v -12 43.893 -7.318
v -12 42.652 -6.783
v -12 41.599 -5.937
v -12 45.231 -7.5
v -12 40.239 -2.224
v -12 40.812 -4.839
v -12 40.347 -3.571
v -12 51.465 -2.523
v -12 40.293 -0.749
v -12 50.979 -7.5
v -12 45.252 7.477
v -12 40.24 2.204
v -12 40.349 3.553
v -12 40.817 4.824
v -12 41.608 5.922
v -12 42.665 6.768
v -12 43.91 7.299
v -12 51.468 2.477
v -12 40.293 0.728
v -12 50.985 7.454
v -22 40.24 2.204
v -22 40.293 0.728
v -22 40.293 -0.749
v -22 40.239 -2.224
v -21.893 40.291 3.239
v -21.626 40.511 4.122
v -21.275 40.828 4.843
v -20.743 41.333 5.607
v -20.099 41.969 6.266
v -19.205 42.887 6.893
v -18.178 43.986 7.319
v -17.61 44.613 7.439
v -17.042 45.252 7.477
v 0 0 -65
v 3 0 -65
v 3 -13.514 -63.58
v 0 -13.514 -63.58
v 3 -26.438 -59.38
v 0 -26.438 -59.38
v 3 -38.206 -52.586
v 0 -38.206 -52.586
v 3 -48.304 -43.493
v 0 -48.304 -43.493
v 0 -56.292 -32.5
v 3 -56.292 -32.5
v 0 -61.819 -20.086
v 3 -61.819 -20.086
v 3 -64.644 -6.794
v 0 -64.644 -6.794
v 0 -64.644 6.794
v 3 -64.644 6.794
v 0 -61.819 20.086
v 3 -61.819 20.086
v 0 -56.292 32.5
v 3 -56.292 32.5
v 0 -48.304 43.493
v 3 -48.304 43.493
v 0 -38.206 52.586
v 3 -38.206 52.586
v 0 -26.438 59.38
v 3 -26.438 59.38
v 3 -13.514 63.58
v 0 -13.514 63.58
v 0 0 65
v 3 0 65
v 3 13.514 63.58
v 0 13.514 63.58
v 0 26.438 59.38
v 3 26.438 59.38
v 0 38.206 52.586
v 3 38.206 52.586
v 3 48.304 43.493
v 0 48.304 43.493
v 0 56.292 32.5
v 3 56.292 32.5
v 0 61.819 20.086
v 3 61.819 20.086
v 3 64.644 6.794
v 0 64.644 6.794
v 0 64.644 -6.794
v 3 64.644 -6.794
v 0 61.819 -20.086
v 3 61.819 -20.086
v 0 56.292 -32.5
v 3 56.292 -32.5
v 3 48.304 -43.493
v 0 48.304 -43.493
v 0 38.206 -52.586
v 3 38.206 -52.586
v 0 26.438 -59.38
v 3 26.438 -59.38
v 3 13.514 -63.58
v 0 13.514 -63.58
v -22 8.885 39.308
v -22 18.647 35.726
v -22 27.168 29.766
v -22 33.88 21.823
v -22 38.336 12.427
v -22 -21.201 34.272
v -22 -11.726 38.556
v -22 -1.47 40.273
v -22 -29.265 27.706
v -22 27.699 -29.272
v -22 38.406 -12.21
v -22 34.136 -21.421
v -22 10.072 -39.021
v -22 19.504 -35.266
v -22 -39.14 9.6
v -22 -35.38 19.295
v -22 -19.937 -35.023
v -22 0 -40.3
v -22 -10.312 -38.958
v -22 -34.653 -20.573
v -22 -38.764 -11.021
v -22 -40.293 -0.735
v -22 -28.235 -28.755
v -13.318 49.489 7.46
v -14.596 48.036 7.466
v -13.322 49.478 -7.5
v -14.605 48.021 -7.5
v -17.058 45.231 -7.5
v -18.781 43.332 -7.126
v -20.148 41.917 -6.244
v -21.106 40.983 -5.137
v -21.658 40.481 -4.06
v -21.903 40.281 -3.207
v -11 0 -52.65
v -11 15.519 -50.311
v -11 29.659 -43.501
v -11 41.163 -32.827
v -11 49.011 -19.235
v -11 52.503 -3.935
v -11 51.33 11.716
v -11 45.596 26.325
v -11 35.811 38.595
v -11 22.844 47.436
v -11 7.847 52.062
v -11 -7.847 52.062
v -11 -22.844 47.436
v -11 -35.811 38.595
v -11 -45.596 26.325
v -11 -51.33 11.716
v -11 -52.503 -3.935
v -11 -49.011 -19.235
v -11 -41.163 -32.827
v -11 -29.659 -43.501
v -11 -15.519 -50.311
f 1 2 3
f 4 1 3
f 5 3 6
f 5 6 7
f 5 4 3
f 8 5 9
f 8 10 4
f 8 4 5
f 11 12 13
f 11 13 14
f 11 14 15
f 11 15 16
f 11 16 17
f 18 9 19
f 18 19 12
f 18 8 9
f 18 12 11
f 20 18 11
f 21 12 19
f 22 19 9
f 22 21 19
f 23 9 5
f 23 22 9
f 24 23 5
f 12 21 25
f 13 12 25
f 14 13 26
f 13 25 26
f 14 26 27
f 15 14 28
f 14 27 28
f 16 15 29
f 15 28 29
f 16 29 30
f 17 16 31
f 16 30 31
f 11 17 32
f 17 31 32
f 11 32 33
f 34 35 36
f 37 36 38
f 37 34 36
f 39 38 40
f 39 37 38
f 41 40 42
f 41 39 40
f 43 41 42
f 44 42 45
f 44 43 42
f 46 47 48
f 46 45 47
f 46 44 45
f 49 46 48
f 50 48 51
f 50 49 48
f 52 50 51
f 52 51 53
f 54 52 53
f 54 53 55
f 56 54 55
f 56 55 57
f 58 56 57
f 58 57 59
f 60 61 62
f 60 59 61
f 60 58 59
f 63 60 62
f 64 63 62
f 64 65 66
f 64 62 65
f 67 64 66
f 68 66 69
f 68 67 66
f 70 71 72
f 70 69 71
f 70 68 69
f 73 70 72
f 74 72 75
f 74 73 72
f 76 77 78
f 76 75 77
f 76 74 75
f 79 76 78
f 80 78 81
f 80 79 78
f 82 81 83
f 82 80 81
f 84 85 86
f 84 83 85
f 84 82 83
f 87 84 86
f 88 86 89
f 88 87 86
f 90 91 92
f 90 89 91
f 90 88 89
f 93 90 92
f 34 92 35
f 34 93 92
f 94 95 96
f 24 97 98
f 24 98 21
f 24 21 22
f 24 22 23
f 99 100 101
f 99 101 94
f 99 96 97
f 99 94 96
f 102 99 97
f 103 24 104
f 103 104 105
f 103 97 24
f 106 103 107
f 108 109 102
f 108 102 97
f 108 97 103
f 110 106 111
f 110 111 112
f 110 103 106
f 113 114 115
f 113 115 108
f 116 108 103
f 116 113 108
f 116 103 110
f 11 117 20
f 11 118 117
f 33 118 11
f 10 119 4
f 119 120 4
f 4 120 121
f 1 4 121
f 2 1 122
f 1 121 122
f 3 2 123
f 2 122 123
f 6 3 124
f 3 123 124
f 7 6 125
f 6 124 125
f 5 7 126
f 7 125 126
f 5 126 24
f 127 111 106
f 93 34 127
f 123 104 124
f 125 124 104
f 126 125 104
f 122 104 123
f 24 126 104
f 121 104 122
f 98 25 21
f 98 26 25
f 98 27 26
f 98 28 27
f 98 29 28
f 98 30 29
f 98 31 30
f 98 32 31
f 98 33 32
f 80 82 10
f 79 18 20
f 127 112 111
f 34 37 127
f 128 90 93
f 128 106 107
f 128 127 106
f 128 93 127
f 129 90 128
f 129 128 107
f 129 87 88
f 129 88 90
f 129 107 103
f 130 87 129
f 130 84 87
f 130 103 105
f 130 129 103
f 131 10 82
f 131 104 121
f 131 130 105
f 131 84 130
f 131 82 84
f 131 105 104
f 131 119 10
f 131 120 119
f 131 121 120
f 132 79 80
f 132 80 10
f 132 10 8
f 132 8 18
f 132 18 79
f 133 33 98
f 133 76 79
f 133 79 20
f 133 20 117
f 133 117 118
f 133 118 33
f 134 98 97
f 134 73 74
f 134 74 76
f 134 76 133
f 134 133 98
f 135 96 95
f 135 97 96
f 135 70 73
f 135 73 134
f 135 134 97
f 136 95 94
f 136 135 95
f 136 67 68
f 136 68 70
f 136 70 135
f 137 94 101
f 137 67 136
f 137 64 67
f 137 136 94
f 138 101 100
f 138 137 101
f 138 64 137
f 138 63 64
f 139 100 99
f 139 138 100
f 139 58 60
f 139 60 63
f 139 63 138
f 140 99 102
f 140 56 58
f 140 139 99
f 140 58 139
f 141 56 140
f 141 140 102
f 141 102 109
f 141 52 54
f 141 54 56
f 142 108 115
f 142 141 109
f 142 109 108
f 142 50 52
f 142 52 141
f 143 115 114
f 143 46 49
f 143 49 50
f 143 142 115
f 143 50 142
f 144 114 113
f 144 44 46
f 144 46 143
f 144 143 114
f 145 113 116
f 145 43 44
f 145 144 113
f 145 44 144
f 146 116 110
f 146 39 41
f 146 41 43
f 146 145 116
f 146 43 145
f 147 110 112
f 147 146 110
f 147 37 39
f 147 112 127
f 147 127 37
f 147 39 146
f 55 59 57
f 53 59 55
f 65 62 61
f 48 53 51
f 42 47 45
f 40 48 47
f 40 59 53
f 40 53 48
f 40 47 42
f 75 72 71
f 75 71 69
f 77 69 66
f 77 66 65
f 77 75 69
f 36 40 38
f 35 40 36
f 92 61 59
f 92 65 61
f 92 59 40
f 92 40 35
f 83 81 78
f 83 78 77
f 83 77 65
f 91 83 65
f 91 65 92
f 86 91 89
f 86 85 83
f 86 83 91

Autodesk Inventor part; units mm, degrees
ref_plane "YZ Plane" through (0, 0, 0) normal (1, 0, 0) x (0, 1, 0)
ref_plane "XZ Plane" through (0, 0, 0) normal (0, 1, 0) x (-1, 0, 0)
ref_plane "XY Plane" through (0, 0, 0) normal (0, 0, 1) x (1, 0, 0)
sketch "Sketch2" plane through (0, 0, 0) normal (0, 1, 0) x (-1, 0, 0)
  line L0 (0, 0) -> (0, -65)
  line L1 (0, 0) -> (22, 0)
  line L2 (22, 0) -> (22, -40.3)
  line L3 (22, -40.3) -> (0, -65)
  dimension "d4" = 65
  dimension "d5" = 22
  dimension "d6" = 40.3
revolve "Revolution1" add sketch "Sketch2" angle 360 about axis through (0, 0, 0) along (-1, 0, 0)
sketch "Sketch3" plane through (-22, 0, 0) normal (-1, 0, 0) x (0, 0, 1)
  circle A0 centre (0, 0) radius 40.3 projected
  line L0 (0, 40.3) -> (0, 64.3)
  line L1 (0, 64.3) -> (-7.5, 64.3)
  line L2 (-7.5, 64.3) -> (-7.5, 45.231)
  line L3 (0, 64.3) -> (7.4, 64.3)
  line L4 (7.4, 64.3) -> (7.4771, 45.2525)
  arc A1 (2.2037, 40.2397) -> (-2.2241, 40.2386) centre (0, 0) ccw
  arc A2 (-7.5, 45.231) -> (-2.2241, 40.2386) centre (-2.5, 45.231) ccw
  arc A3 (2.2037, 40.2397) -> (7.4771, 45.2525) centre (2.4771, 45.2322) ccw
  point P0 (-7.5, 39.596)
  point P1 (7.5, 39.596)
  dimension "d11" = 24
  dimension "d12" = 7.5
  dimension "d13" = 7.4
  dimension "d17" = 5
extrude "Extrusion1" cut sketch "Sketch3" against normal blind 10 contours A0 L0 L3 L4 A3 | A2 L2 L1 L0 A0
sketch "Sketch4" plane through (-22, 0, 0) normal (-1, 0, 0) x (0, 0.0003, 1)
  point P0 (0, 0)
sketch "Sketch6" plane through (-12, 0, 0) normal (-1, 0, 0) x (0, 0, 1)
  point P0 (0, 0)
sketch "Sketch7" plane through (-22, 0, 0) normal (-1, 0, 0) x (0, 0.0003, 1)
  point P0 (0, 0)
sketch "Sketch8" plane through (0, 0, 0) normal (1, 0, 0) x (0, 0, -1)
  circle A0 centre (0, 0) radius 65
extrude "Extrusion2" add sketch "Sketch8" along normal blind 3
sketch "Sketch10" plane through (-22, 0, 0) normal (-1, 0, 0) x (0, 0.0003, 1)
  line L0 (0, 0) -> (-112.4723, 0)
  line L1 (-112.4723, 0) -> (-112.4723, -208.2132)
  line L2 (-112.4723, -208.2132) -> (0, -208.2132)
  line L3 (0, -208.2132) -> (0, 0)
properties part number "Handle Gearbox" material "PC/ABS Plastic"
